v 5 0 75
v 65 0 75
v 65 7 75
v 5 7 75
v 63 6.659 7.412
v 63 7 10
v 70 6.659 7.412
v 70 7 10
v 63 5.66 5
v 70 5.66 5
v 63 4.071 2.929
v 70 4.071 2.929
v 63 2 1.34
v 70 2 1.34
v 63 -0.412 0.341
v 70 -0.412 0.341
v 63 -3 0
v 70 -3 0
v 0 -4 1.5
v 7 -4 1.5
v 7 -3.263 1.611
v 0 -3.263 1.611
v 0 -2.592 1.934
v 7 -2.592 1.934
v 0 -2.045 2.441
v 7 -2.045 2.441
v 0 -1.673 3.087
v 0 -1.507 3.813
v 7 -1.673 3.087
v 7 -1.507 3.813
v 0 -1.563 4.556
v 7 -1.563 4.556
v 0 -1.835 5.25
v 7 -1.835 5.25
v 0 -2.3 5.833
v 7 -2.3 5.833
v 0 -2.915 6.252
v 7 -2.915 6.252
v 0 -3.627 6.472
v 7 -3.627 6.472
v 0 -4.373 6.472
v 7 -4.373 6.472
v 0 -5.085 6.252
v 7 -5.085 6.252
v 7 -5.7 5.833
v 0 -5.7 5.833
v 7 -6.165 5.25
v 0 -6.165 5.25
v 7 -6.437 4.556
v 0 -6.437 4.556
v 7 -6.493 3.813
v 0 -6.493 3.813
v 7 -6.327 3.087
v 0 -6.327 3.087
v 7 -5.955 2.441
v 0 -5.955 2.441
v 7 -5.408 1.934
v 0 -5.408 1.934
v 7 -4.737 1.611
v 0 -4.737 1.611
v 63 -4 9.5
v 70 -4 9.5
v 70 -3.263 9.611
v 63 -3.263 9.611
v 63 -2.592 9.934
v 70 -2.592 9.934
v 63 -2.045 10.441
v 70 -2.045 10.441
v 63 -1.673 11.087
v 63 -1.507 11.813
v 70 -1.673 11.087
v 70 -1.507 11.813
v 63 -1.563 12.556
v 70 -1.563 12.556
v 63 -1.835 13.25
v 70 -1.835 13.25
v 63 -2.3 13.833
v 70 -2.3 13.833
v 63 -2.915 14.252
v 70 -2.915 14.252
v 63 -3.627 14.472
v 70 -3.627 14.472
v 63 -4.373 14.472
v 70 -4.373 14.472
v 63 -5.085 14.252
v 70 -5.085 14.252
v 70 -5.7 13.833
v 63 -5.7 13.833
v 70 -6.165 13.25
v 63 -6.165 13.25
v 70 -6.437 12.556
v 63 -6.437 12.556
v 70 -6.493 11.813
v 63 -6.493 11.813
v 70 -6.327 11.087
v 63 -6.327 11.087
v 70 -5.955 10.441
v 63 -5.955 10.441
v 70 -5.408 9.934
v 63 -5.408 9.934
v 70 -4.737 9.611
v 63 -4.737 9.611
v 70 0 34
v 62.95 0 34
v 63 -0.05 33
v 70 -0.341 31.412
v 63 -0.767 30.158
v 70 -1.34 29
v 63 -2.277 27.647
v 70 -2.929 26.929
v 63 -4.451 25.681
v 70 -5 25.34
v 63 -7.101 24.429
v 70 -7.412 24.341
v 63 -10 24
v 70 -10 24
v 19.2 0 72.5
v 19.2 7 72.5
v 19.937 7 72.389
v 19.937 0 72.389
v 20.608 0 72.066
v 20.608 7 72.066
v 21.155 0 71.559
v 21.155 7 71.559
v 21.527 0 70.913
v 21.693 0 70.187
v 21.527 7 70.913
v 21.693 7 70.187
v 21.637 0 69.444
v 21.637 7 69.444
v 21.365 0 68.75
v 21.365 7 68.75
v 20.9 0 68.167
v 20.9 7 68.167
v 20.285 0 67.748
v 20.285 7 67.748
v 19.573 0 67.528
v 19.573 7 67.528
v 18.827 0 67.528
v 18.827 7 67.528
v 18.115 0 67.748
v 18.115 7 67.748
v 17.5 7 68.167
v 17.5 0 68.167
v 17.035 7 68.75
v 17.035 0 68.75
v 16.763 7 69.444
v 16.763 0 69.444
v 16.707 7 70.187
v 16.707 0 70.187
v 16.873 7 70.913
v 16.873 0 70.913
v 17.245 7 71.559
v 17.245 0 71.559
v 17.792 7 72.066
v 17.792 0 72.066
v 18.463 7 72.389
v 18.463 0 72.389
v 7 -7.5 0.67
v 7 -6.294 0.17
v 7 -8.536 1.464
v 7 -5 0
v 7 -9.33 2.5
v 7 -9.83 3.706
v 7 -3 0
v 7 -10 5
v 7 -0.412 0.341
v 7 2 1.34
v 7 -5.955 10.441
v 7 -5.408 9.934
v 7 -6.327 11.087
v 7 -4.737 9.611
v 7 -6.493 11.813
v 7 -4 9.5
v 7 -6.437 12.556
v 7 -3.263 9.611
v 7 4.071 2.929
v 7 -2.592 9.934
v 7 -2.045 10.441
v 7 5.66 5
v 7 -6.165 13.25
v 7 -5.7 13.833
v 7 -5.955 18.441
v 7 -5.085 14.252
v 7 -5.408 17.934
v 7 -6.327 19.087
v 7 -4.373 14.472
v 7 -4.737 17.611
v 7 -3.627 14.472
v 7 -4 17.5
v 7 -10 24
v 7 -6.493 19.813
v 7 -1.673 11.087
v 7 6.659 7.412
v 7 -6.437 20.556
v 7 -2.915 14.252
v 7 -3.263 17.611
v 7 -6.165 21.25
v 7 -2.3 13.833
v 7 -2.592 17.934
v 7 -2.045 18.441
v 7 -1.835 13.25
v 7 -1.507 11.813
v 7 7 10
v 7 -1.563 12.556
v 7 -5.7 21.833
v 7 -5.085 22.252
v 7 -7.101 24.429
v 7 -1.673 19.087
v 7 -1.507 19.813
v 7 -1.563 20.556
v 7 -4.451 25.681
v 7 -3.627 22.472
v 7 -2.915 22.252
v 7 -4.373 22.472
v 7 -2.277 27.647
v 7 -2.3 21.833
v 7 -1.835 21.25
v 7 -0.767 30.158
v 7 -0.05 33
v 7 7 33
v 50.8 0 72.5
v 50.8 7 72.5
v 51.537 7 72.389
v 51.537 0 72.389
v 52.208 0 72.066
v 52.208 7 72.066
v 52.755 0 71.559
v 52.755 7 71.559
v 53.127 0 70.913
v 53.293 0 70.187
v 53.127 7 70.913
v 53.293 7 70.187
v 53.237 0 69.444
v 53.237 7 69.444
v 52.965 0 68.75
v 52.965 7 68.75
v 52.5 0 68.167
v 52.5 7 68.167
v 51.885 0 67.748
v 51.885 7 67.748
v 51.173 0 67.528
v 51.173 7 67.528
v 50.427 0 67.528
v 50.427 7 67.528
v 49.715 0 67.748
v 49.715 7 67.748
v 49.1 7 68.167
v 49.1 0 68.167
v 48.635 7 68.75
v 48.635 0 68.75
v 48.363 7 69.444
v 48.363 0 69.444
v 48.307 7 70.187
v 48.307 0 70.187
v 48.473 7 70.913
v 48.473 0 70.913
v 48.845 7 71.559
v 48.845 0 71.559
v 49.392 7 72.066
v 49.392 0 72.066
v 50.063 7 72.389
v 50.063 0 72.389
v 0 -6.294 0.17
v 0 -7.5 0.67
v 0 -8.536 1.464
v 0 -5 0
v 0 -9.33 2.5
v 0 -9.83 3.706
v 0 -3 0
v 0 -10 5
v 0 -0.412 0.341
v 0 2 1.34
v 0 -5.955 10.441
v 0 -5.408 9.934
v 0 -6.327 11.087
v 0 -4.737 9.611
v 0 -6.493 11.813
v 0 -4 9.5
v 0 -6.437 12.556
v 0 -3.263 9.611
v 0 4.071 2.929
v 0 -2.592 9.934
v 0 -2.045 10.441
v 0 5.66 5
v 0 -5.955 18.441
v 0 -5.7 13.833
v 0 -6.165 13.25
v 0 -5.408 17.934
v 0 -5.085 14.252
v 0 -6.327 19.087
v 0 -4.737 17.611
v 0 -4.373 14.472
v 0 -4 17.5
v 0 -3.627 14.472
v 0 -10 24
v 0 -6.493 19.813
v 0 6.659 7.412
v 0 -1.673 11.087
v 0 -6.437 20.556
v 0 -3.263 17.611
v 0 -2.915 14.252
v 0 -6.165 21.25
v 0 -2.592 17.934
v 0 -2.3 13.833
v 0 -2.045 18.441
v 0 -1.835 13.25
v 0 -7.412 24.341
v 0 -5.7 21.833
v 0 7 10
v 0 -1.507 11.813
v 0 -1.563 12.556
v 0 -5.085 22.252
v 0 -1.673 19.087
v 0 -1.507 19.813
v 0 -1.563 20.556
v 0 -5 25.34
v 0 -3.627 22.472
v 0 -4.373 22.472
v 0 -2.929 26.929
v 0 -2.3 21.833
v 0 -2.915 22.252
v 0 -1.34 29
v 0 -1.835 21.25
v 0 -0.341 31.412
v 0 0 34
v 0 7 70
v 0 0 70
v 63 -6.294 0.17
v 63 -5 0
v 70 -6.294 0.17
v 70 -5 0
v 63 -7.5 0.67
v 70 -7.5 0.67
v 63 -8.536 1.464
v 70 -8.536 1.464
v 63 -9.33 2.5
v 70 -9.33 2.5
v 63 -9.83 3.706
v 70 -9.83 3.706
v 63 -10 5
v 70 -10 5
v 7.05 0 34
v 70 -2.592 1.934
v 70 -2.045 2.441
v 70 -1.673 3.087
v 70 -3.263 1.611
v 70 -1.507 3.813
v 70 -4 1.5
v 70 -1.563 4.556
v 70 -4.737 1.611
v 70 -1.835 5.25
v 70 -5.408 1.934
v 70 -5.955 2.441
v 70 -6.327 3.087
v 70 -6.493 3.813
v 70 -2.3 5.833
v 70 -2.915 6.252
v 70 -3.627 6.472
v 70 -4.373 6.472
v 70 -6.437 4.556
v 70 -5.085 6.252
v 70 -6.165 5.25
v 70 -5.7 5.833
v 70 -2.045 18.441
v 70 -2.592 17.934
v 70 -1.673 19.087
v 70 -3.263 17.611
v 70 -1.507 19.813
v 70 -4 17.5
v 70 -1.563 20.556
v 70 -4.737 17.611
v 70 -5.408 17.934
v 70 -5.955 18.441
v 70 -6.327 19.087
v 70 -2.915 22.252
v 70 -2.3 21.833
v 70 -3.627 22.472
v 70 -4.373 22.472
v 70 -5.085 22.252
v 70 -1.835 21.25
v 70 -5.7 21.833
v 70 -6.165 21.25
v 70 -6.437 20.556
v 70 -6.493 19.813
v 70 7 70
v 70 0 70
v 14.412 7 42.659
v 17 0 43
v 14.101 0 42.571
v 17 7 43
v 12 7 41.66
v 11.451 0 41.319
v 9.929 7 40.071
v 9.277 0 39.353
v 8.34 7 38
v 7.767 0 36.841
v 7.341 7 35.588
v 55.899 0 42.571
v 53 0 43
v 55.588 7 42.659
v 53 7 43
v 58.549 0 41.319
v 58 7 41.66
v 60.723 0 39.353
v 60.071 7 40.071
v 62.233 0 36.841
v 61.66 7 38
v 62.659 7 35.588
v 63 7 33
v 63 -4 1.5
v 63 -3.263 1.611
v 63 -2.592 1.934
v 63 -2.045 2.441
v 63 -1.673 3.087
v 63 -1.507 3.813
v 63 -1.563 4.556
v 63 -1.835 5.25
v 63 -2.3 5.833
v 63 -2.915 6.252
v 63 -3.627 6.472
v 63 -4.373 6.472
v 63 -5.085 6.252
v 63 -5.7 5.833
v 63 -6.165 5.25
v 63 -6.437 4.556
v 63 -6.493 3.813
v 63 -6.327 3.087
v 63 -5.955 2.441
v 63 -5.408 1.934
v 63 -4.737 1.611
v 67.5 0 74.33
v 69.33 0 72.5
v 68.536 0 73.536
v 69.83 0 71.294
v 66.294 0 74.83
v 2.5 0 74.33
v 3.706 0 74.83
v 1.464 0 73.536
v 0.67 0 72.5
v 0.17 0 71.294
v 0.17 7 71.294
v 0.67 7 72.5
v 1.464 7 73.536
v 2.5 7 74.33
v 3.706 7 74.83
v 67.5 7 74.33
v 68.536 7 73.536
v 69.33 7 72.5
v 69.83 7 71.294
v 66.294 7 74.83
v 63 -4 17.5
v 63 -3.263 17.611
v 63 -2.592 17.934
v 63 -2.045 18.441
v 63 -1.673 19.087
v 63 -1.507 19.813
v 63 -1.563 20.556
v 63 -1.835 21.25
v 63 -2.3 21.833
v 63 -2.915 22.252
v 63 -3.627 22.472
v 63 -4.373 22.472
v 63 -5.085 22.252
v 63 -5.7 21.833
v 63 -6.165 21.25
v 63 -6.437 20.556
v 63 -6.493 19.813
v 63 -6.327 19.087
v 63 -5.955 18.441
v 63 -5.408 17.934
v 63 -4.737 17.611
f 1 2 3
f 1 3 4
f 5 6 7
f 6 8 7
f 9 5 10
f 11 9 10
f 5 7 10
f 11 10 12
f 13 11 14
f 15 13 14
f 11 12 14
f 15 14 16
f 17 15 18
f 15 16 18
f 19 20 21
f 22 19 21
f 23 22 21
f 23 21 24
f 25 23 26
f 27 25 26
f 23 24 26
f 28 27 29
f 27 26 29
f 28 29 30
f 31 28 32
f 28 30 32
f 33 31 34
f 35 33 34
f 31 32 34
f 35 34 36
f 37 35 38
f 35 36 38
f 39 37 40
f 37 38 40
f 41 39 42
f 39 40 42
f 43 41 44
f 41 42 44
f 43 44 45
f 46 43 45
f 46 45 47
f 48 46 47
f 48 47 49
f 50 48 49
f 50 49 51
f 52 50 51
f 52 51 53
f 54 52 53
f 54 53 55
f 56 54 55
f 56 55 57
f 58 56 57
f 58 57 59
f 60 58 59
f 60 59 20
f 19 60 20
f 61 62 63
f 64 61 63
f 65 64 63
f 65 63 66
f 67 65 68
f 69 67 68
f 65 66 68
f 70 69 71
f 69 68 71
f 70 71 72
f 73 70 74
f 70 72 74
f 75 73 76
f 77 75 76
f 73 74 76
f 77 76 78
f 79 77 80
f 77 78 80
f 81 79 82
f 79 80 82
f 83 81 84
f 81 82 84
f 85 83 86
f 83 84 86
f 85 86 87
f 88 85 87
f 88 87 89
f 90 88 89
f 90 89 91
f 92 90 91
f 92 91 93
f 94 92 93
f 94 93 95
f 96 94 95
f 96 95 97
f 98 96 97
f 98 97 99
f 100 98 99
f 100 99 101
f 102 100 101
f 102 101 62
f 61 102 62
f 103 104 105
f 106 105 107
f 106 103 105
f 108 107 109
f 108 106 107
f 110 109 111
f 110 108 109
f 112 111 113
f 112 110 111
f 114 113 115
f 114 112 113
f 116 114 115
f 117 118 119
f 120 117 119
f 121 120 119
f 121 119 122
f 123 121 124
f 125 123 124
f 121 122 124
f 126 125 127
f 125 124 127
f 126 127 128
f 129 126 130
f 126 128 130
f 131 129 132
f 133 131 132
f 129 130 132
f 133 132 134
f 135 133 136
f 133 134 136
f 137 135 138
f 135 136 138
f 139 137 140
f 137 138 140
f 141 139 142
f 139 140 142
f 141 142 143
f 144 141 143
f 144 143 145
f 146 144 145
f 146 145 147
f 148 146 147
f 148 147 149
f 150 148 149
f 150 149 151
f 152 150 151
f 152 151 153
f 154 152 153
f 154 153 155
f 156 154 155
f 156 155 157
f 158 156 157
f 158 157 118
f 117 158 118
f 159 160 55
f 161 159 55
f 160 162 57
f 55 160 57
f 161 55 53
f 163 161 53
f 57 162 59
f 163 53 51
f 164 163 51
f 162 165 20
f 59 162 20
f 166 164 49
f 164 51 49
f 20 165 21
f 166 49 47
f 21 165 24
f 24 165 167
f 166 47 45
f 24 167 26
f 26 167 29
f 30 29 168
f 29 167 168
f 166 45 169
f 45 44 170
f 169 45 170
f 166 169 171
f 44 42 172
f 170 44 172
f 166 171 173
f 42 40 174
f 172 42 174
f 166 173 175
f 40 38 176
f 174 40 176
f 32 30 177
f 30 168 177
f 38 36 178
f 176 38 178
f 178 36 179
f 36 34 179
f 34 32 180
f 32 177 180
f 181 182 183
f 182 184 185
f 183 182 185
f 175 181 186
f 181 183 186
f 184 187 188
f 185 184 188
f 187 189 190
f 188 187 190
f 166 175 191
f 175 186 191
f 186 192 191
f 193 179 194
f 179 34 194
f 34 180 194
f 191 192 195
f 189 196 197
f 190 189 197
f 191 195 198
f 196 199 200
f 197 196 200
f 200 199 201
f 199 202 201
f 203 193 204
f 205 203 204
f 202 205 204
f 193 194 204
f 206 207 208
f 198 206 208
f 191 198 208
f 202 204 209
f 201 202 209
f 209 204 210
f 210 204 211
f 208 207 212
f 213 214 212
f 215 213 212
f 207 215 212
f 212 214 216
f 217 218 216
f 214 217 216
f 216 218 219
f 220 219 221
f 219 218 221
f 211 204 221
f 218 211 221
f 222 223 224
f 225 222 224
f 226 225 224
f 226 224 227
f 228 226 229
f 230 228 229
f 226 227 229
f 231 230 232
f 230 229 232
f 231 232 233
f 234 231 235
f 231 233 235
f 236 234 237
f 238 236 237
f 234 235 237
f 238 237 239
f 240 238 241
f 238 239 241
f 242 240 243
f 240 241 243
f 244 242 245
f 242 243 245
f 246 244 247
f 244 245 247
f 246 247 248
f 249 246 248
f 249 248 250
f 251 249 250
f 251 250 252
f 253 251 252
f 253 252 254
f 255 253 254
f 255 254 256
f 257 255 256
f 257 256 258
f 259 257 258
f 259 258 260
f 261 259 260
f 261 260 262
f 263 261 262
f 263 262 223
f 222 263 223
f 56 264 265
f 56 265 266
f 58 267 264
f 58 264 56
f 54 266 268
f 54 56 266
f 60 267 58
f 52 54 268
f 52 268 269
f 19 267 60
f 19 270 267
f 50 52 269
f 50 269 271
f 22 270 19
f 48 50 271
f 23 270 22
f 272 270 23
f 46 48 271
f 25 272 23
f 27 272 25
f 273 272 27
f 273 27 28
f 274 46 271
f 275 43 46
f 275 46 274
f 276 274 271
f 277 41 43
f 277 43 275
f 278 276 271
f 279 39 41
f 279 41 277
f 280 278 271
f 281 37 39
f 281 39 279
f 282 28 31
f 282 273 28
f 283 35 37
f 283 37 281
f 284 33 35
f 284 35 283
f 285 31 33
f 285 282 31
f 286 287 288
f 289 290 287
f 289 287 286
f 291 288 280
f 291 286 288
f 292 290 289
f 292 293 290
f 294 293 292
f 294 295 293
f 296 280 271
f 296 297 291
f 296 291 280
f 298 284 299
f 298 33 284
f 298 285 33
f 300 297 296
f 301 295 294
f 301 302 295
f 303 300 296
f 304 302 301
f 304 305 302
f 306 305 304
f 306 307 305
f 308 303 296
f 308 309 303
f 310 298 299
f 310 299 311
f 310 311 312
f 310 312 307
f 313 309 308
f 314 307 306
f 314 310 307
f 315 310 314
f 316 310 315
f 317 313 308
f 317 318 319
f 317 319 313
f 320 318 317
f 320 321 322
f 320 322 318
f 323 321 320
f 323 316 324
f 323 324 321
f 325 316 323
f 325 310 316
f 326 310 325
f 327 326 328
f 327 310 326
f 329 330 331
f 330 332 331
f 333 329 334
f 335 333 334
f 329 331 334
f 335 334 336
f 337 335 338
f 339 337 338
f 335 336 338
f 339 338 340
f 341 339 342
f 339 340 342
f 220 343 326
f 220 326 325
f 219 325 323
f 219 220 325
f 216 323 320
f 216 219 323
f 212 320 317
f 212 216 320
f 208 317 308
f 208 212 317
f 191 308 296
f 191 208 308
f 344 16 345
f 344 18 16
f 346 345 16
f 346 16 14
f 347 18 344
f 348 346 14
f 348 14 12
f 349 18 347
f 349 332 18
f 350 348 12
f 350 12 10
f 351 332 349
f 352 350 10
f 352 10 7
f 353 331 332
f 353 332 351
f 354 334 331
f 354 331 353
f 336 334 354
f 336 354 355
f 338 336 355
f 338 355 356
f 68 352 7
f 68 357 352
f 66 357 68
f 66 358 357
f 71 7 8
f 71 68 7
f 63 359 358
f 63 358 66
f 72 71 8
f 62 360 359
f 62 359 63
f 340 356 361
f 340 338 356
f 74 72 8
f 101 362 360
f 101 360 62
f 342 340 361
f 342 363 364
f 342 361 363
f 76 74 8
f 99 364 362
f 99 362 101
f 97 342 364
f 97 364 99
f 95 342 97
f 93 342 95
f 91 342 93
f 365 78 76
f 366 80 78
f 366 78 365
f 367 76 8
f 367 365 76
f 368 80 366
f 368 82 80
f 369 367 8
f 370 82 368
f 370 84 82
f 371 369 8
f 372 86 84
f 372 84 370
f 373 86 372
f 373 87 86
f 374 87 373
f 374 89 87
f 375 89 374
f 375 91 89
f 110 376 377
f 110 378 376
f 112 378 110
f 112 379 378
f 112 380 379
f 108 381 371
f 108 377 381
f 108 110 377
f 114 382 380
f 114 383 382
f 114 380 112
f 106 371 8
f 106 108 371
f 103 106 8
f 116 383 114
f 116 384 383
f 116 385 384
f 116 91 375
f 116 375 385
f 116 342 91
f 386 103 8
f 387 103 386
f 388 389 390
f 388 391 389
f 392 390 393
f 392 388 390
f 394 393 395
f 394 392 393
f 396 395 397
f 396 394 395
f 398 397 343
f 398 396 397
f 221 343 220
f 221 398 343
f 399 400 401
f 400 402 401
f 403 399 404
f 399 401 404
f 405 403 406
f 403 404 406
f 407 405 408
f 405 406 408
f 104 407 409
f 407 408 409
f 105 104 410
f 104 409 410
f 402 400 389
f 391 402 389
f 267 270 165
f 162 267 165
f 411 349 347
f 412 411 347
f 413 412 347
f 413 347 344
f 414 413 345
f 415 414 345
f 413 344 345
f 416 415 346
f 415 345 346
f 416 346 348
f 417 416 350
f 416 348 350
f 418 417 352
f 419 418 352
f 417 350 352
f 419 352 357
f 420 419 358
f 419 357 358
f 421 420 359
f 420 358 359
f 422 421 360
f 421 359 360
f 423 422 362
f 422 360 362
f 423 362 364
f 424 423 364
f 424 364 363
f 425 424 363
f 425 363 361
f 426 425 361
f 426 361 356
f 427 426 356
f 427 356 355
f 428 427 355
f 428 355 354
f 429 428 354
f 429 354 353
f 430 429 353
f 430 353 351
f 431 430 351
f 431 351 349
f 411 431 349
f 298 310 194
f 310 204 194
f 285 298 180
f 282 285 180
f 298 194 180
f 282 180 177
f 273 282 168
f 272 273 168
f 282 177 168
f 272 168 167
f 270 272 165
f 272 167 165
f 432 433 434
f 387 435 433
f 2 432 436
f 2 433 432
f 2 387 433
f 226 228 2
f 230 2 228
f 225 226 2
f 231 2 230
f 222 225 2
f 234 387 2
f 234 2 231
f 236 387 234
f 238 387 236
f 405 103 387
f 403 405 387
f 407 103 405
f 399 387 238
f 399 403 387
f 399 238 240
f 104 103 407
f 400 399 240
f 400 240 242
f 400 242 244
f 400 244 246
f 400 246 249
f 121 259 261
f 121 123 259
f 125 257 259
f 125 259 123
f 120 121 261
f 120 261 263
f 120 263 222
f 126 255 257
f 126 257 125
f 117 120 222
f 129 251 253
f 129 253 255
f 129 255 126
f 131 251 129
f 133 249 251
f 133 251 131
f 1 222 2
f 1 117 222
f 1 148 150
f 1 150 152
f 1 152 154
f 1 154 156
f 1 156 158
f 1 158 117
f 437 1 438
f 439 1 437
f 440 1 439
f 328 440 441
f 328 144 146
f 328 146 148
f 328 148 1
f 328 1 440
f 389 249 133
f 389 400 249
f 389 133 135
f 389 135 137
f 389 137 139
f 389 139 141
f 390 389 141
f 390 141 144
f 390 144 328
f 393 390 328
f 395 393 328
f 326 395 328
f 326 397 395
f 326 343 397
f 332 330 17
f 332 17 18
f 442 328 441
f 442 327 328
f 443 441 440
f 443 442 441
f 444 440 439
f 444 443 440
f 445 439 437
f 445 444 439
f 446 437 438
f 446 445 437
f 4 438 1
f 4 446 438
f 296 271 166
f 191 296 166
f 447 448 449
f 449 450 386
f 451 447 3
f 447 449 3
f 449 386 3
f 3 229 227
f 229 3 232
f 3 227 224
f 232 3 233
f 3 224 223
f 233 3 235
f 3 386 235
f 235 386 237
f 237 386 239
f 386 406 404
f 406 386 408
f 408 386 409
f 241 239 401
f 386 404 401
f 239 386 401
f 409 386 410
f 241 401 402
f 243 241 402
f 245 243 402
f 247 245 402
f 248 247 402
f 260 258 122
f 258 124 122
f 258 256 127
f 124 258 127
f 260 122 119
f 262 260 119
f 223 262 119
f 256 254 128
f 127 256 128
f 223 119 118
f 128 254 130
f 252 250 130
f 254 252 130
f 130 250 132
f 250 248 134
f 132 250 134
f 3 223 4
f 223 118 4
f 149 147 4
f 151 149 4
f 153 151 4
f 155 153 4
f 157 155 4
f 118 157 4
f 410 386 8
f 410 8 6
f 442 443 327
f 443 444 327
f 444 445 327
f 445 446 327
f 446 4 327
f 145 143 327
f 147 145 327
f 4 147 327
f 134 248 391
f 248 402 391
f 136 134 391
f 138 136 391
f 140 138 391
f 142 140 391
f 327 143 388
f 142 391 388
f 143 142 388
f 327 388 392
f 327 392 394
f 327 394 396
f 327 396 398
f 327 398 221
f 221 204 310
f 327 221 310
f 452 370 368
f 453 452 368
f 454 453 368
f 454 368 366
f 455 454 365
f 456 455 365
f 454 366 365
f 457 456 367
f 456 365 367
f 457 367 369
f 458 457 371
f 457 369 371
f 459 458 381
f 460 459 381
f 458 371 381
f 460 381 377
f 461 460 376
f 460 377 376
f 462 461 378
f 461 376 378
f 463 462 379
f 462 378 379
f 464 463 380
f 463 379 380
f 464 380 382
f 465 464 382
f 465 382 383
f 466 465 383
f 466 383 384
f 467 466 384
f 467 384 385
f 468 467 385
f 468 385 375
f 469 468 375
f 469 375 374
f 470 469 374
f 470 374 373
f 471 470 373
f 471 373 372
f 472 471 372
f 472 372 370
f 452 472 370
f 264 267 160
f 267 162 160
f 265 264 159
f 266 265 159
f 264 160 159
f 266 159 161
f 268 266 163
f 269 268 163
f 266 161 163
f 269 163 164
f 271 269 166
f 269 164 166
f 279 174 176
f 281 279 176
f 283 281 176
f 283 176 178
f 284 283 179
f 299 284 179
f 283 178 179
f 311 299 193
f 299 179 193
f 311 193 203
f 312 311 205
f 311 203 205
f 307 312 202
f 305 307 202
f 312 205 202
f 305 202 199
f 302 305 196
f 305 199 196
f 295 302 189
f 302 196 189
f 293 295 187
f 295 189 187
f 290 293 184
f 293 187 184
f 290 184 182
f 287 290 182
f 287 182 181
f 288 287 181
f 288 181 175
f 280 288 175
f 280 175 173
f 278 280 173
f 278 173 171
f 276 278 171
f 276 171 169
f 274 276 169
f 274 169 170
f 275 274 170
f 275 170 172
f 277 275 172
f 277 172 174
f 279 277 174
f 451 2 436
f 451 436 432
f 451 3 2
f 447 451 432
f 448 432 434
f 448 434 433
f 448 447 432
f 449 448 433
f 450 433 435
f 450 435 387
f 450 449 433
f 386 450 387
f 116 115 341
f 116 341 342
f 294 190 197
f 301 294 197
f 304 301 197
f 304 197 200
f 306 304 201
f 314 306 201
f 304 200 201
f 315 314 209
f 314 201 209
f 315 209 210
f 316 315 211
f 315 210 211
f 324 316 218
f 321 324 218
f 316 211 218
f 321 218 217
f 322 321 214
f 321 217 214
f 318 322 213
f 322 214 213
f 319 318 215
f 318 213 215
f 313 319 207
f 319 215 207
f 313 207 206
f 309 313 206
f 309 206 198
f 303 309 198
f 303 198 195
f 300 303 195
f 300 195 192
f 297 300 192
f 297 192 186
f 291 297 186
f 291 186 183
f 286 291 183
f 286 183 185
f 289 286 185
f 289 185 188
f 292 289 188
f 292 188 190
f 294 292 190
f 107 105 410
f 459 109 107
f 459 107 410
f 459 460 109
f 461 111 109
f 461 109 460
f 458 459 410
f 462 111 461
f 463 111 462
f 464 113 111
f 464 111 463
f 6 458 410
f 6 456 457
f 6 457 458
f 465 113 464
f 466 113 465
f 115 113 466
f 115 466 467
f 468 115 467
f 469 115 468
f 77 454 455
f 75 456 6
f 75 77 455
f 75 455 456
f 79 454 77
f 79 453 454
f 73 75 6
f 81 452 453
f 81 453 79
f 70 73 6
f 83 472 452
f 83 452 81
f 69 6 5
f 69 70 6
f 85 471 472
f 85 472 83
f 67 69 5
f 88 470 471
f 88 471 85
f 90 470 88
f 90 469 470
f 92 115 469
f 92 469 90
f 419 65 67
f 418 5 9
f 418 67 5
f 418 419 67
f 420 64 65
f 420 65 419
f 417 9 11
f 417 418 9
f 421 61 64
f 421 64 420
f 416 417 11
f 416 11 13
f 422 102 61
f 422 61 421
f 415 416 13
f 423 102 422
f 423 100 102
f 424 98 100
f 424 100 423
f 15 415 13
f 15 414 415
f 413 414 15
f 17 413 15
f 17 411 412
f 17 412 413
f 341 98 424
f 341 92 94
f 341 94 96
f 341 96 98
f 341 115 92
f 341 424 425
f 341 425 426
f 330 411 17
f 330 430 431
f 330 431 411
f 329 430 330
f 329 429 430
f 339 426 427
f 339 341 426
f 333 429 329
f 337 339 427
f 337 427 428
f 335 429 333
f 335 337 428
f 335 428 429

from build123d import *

# Parameters (mm, degrees)
EXTRUDE_1_DEPTH     = 7
SKETCH_2_W          = 7
SKETCH_2_H          = 24
EXTRUDE_2_DEPTH     = 10
FILLET_1_R          = 10
FILLET_2_R          = 10
SKETCH_3_R          = 2.5
CUT_EXTRUDE_1_DEPTH = 104.07764064
FILLET_3_R          = 10
FILLET_4_R          = 10
FILLET_5_R          = 10
FILLET_6_R          = 10
FILLET_8_R          = 5
FILLET_9_R          = 5
SKETCH_4_R          = 2.5
CUT_EXTRUDE_2_DEPTH = 104.077640708
SKETCH_5_R          = 2.5
CUT_EXTRUDE_3_DEPTH = 104.990384238
FILLET_10_R         = 5
FILLET_11_R         = 5


with BuildPart() as part:
    # 草图1 → 凸台-拉伸1 (new body)
    with BuildSketch(Plane(origin=(0, 0, 0), x_dir=(1, 0, 0), z_dir=(0, 1, 0))):
        Polygon((0, 0), (7, 0), (7, -43), (35, -43), (63, -43), (63, 0), (70, 0), (70, -75), (0, -75), align=None)
    extrude(amount=EXTRUDE_1_DEPTH)

    # 草图2 → 凸台-拉伸2 (add)
    with BuildSketch(Plane.XZ):
        with Locations((3.5, 12)):
            Rectangle(SKETCH_2_W, SKETCH_2_H)
        with Locations((66.5, 12)):
            Rectangle(SKETCH_2_W, SKETCH_2_H)
    extrude(amount=EXTRUDE_2_DEPTH)

    # 圆角1
    fillet_1_edges = [part.edges().sort_by_distance(p)[0] for p in [
        (3.5, 0, 24),
    ]]
    fillet(fillet_1_edges, radius=FILLET_1_R - 0.0001)  # a hair under: the kernel refuses the full size

    # 圆角2
    fillet_2_edges = [part.edges().sort_by_distance(p)[0] for p in [
        (66.5, 0, 24),
    ]]
    fillet(fillet_2_edges, radius=FILLET_2_R - 0.0001)  # a hair under: the kernel refuses the full size

    # 草图3 → 切除-拉伸1 (cut, through all)
    with BuildSketch(Plane(origin=(70, 0, 0), x_dir=(0, 0, -1), z_dir=(1, 0, 0))):
        with Locations((-12, -4)):
            Circle(SKETCH_3_R)
    extrude(amount=-CUT_EXTRUDE_1_DEPTH, mode=Mode.SUBTRACT)

    # 圆角3
    fillet_3_edges = [part.edges().sort_by_distance(p)[0] for p in [
        (3.5, 7, 0),
    ]]
    fillet(fillet_3_edges, radius=FILLET_3_R)

    # 圆角4
    fillet_4_edges = [part.edges().sort_by_distance(p)[0] for p in [
        (66.5, 7, 0),
    ]]
    fillet(fillet_4_edges, radius=FILLET_4_R)

    # 圆角5
    fillet_5_edges = [part.edges().sort_by_distance(p)[0] for p in [
        (7, 3.5, 43),
    ]]
    fillet(fillet_5_edges, radius=FILLET_5_R)

    # 圆角6
    fillet_6_edges = [part.edges().sort_by_distance(p)[0] for p in [
        (63, 3.5, 43),
    ]]
    fillet(fillet_6_edges, radius=FILLET_6_R)

    # 圆角8
    fillet_8_edges = [part.edges().sort_by_distance(p)[0] for p in [
        (66.5, -10, 0),
    ]]
    fillet(fillet_8_edges, radius=FILLET_8_R)

    # 圆角9
    fillet_9_edges = [part.edges().sort_by_distance(p)[0] for p in [
        (3.5, -10, 0),
    ]]
    fillet(fillet_9_edges, radius=FILLET_9_R)

    # 草图4 → 切除-拉伸2 (cut, through all)
    with BuildSketch(Plane(origin=(70, 0, 0), x_dir=(0, 0, -1), z_dir=(1, 0, 0))):
        with Locations((-4, -4)):
            Circle(SKETCH_4_R)
        with Locations((-20, -4)):
            Circle(SKETCH_4_R)
    extrude(amount=-CUT_EXTRUDE_2_DEPTH, mode=Mode.SUBTRACT)

    # 草图5 → 切除-拉伸3 (cut, through all)
    with BuildSketch(Plane(origin=(0, 7, 0), x_dir=(1, 0, 0), z_dir=(0, 1, 0))):
        with Locations(Location((19.2, -70, 0), (0, 0, 270))):
            Circle(SKETCH_5_R)
        with Locations(Location((50.8, -70, 0), (0, 0, 270))):
            Circle(SKETCH_5_R)
    extrude(amount=-CUT_EXTRUDE_3_DEPTH, mode=Mode.SUBTRACT)

    # 圆角10
    fillet_10_edges = [part.edges().sort_by_distance(p)[0] for p in [
        (0, 3.5, 75),
    ]]
    fillet(fillet_10_edges, radius=FILLET_10_R)

    # 圆角11
    fillet_11_edges = [part.edges().sort_by_distance(p)[0] for p in [
        (70, 3.5, 75),
    ]]
    fillet(fillet_11_edges, radius=FILLET_11_R)


solid = part.part
